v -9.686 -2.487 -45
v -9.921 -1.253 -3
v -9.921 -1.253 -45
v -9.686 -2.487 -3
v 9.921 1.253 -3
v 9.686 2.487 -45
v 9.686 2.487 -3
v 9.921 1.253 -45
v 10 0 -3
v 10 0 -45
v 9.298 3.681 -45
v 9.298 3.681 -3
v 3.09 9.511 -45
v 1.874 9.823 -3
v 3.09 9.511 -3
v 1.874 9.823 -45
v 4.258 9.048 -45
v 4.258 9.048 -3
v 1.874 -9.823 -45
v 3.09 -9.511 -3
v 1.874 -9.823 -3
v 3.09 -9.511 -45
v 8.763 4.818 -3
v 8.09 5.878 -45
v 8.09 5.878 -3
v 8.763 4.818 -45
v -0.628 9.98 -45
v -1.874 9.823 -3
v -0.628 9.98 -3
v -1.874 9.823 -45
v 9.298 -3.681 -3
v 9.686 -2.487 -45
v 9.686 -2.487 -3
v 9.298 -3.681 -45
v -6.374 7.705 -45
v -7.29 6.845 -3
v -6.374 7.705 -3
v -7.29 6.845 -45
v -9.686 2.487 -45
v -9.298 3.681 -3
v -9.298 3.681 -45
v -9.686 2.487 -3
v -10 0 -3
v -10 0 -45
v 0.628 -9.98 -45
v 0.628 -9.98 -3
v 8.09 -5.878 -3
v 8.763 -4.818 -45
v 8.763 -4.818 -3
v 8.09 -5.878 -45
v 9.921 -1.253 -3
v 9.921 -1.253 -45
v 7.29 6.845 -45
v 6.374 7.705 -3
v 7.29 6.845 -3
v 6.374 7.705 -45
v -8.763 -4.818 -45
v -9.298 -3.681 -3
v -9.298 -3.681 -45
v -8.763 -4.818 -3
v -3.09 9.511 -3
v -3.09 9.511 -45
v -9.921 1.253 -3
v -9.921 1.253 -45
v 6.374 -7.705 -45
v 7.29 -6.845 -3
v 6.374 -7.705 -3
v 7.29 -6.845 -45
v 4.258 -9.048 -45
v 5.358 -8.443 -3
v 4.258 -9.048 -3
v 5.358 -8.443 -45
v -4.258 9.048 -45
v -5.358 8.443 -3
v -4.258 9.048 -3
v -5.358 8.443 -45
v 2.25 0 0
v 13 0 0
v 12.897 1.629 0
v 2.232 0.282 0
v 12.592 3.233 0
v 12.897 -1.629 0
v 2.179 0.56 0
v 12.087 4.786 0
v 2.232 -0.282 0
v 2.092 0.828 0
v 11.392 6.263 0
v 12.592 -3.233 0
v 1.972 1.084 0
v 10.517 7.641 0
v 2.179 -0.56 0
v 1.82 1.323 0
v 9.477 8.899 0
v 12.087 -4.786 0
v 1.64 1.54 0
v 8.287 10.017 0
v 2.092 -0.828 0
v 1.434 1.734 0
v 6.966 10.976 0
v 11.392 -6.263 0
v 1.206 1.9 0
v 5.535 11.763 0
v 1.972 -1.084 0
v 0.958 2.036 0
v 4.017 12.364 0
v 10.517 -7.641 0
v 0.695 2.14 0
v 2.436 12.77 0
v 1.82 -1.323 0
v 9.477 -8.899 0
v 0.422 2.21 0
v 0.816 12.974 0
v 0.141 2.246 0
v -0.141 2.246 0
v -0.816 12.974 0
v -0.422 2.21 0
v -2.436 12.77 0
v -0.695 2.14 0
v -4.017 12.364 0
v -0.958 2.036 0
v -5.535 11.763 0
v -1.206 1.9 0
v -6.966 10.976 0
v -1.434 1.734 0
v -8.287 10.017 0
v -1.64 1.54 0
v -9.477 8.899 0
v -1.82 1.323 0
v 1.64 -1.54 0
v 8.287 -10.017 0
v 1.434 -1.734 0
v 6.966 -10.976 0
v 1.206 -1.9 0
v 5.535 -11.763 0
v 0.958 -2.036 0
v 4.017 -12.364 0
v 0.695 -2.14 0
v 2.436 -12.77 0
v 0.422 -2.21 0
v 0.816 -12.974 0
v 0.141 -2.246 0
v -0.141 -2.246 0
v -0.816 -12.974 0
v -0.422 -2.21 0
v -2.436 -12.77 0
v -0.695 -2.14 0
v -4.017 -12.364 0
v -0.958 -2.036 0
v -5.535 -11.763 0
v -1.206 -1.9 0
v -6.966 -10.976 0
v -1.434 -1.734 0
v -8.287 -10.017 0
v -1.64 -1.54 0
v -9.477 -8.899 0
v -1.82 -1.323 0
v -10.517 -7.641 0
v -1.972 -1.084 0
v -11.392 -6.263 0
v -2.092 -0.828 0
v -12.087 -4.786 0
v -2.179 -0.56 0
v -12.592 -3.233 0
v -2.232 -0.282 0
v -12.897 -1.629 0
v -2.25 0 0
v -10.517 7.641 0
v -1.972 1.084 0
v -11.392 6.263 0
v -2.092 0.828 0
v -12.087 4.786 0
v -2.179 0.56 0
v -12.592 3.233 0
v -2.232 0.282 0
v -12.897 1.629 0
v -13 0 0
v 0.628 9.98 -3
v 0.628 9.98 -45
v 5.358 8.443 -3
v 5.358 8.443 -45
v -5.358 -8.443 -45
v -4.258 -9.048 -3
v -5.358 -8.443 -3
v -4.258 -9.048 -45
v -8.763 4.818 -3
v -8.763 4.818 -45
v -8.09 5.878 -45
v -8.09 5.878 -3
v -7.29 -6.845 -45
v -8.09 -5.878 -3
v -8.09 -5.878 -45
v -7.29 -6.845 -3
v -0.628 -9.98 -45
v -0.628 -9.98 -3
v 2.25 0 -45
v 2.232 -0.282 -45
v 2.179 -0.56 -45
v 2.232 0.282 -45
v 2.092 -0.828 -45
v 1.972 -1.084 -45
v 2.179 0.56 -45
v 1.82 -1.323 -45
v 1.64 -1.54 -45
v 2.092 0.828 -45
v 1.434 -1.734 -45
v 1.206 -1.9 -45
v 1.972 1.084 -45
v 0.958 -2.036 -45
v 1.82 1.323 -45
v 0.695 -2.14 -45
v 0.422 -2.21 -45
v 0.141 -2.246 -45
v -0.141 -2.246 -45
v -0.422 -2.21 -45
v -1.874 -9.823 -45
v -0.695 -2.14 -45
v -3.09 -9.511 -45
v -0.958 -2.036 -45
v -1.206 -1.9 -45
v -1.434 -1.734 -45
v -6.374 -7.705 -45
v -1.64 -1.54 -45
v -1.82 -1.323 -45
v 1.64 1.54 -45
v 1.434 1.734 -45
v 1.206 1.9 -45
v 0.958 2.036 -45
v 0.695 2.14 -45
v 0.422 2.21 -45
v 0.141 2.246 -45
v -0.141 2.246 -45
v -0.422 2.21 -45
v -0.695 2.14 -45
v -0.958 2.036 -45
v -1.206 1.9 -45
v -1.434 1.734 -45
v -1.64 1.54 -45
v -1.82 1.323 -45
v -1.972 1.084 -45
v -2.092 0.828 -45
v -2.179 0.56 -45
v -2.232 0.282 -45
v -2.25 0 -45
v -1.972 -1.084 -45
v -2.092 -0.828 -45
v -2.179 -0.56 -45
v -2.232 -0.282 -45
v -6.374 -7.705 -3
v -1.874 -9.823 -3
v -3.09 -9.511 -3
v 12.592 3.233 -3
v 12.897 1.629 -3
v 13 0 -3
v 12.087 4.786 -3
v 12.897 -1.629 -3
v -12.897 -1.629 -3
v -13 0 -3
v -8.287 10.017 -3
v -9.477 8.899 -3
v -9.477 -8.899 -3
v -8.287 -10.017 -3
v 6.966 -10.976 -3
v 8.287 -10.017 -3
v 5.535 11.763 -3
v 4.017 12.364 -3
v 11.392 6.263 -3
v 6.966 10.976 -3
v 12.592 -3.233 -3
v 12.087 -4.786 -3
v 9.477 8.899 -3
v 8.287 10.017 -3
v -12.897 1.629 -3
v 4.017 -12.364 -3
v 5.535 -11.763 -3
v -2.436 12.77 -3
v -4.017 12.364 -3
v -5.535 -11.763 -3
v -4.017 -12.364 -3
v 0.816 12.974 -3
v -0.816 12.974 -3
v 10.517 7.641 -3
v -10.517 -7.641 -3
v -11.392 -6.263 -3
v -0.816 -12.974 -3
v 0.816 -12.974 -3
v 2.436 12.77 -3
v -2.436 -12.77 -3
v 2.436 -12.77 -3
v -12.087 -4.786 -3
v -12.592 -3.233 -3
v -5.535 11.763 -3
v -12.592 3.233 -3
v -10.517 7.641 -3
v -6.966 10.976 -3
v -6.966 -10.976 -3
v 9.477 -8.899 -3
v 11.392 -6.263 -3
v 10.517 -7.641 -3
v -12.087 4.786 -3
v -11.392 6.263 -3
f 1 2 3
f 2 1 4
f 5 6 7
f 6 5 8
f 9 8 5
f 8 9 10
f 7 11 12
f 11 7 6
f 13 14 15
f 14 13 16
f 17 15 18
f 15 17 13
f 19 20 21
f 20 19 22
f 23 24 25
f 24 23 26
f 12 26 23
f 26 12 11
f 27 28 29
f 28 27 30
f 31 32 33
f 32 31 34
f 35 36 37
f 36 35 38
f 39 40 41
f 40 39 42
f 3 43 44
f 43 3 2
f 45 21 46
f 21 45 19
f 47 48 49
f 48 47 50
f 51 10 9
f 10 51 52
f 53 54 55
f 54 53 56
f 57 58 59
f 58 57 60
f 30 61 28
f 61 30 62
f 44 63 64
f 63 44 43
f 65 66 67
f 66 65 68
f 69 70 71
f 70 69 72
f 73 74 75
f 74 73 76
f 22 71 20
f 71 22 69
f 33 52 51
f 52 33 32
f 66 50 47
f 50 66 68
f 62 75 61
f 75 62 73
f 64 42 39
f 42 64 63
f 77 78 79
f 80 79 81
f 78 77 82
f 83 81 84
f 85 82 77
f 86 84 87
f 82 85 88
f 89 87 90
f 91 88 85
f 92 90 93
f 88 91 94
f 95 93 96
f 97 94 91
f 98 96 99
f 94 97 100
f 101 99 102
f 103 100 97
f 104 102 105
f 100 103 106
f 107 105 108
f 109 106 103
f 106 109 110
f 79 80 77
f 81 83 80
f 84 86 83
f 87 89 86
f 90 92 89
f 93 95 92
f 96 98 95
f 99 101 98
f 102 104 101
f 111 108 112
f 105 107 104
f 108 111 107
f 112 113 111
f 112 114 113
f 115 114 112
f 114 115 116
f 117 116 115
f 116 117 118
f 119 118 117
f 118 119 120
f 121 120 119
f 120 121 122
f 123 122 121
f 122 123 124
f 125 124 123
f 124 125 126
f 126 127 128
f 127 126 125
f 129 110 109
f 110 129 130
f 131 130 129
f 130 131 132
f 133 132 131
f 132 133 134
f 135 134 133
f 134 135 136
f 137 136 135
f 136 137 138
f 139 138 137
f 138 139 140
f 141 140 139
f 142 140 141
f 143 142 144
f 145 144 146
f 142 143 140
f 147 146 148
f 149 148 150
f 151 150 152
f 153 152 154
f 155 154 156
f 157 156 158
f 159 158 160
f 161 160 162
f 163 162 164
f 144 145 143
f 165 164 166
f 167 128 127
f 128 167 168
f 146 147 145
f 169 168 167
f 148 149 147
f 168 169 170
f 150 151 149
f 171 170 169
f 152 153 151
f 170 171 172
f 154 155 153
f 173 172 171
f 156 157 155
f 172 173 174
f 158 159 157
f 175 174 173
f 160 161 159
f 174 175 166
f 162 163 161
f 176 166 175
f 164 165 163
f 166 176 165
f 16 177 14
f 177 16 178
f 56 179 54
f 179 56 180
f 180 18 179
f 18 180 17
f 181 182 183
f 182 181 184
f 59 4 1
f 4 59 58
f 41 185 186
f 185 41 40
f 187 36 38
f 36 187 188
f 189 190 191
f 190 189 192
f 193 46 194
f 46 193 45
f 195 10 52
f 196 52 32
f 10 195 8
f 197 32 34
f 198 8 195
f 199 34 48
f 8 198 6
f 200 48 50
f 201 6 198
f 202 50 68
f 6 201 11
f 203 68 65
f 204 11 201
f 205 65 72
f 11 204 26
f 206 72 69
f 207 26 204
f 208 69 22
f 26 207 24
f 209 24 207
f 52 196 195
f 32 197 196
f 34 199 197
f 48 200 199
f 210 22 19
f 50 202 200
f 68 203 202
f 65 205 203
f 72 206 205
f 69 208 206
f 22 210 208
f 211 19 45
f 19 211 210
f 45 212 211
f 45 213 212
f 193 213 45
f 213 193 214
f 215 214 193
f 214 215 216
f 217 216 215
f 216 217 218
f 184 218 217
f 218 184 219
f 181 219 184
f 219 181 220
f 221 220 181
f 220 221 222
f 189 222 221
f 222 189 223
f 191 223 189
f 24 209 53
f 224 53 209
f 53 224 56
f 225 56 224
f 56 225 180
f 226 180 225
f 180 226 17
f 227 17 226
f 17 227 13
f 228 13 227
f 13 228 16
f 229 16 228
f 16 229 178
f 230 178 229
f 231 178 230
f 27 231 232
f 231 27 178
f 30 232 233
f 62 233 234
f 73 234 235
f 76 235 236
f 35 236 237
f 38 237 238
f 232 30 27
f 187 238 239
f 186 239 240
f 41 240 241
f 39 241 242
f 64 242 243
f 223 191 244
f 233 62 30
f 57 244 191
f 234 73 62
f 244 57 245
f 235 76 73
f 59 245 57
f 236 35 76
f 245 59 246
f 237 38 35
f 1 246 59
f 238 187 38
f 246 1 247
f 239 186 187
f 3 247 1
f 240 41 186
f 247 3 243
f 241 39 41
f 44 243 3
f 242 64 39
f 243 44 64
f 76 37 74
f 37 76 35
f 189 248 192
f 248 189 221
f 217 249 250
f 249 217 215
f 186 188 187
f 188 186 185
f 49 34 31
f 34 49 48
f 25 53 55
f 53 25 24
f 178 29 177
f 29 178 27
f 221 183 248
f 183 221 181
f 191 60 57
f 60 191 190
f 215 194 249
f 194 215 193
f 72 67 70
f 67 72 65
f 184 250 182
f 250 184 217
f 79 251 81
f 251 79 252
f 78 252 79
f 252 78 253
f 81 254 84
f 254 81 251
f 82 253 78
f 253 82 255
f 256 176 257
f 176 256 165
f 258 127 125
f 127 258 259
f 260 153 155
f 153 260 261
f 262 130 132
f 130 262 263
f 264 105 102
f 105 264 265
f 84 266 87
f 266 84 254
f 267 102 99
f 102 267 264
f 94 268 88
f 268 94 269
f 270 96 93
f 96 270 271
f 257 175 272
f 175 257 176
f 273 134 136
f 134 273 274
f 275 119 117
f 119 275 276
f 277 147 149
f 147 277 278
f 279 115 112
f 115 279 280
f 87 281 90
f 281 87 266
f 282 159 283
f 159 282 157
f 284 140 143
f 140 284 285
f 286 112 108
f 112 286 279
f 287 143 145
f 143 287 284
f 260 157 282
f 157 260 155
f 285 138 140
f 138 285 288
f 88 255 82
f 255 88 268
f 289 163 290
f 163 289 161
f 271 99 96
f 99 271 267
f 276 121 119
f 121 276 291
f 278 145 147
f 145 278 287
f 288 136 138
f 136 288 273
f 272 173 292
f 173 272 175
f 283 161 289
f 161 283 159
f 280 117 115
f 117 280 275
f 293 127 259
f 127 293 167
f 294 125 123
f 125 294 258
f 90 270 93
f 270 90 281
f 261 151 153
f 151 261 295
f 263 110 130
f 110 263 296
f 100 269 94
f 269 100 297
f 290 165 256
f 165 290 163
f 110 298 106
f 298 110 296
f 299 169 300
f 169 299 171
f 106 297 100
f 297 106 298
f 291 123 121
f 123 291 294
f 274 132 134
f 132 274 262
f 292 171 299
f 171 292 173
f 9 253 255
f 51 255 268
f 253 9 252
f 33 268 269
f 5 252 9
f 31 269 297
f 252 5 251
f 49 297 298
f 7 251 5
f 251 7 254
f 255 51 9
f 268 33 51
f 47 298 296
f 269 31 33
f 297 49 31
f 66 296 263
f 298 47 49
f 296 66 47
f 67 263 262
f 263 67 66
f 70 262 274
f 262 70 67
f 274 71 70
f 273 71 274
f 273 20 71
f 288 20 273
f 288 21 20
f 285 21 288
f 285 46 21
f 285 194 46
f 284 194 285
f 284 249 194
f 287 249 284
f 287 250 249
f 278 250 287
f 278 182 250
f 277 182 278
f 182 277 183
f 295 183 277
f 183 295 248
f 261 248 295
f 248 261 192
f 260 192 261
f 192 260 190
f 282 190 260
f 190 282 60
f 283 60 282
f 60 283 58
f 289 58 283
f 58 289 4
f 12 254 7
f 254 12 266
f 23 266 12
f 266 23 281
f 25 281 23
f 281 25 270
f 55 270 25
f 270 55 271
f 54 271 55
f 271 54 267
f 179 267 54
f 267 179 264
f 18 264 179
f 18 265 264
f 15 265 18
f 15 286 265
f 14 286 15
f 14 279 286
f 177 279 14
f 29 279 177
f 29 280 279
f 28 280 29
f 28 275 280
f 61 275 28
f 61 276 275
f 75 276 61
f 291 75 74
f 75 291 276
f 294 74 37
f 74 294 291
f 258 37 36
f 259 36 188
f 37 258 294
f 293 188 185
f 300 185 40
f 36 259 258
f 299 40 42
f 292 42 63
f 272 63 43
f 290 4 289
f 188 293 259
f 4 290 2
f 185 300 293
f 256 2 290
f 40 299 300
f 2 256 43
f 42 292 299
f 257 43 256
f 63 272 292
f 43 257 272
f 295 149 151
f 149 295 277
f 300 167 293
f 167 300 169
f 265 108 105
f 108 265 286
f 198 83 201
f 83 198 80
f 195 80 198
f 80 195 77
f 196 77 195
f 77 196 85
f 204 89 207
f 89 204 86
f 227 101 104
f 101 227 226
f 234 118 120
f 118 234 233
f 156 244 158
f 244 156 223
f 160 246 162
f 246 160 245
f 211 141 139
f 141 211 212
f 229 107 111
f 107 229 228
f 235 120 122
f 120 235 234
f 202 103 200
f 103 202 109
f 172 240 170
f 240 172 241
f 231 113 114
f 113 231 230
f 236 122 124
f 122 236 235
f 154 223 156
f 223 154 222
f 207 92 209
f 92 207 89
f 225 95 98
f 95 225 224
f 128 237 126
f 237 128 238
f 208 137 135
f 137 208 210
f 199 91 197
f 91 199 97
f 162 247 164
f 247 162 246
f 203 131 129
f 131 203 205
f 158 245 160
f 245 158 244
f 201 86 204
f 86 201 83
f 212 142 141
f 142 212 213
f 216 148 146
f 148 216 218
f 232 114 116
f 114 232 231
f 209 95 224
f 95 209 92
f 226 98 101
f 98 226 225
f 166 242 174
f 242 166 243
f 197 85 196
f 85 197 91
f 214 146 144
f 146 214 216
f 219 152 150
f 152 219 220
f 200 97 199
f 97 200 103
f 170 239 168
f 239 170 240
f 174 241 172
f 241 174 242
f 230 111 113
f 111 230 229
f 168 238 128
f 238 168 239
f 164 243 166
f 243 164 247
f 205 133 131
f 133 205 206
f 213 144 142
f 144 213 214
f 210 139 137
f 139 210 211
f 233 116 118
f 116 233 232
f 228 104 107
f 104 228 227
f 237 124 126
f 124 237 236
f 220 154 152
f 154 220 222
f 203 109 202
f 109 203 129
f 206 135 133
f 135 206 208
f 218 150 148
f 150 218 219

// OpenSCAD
$fn = 50;


difference() {
	union() {
		translate(v = [0, 0, -45.0000000000]) {
			cylinder(h = 45, r = 10.0000000000);
		}
		translate(v = [0, 0, -3.0000000000]) {
			cylinder(h = 3, r = 13.0000000000);
		}
	}
	union() {
		#translate(v = [0, 0, -45]) {
			cylinder(h = 45, r = 2.2500000000);
		}
	}
}
